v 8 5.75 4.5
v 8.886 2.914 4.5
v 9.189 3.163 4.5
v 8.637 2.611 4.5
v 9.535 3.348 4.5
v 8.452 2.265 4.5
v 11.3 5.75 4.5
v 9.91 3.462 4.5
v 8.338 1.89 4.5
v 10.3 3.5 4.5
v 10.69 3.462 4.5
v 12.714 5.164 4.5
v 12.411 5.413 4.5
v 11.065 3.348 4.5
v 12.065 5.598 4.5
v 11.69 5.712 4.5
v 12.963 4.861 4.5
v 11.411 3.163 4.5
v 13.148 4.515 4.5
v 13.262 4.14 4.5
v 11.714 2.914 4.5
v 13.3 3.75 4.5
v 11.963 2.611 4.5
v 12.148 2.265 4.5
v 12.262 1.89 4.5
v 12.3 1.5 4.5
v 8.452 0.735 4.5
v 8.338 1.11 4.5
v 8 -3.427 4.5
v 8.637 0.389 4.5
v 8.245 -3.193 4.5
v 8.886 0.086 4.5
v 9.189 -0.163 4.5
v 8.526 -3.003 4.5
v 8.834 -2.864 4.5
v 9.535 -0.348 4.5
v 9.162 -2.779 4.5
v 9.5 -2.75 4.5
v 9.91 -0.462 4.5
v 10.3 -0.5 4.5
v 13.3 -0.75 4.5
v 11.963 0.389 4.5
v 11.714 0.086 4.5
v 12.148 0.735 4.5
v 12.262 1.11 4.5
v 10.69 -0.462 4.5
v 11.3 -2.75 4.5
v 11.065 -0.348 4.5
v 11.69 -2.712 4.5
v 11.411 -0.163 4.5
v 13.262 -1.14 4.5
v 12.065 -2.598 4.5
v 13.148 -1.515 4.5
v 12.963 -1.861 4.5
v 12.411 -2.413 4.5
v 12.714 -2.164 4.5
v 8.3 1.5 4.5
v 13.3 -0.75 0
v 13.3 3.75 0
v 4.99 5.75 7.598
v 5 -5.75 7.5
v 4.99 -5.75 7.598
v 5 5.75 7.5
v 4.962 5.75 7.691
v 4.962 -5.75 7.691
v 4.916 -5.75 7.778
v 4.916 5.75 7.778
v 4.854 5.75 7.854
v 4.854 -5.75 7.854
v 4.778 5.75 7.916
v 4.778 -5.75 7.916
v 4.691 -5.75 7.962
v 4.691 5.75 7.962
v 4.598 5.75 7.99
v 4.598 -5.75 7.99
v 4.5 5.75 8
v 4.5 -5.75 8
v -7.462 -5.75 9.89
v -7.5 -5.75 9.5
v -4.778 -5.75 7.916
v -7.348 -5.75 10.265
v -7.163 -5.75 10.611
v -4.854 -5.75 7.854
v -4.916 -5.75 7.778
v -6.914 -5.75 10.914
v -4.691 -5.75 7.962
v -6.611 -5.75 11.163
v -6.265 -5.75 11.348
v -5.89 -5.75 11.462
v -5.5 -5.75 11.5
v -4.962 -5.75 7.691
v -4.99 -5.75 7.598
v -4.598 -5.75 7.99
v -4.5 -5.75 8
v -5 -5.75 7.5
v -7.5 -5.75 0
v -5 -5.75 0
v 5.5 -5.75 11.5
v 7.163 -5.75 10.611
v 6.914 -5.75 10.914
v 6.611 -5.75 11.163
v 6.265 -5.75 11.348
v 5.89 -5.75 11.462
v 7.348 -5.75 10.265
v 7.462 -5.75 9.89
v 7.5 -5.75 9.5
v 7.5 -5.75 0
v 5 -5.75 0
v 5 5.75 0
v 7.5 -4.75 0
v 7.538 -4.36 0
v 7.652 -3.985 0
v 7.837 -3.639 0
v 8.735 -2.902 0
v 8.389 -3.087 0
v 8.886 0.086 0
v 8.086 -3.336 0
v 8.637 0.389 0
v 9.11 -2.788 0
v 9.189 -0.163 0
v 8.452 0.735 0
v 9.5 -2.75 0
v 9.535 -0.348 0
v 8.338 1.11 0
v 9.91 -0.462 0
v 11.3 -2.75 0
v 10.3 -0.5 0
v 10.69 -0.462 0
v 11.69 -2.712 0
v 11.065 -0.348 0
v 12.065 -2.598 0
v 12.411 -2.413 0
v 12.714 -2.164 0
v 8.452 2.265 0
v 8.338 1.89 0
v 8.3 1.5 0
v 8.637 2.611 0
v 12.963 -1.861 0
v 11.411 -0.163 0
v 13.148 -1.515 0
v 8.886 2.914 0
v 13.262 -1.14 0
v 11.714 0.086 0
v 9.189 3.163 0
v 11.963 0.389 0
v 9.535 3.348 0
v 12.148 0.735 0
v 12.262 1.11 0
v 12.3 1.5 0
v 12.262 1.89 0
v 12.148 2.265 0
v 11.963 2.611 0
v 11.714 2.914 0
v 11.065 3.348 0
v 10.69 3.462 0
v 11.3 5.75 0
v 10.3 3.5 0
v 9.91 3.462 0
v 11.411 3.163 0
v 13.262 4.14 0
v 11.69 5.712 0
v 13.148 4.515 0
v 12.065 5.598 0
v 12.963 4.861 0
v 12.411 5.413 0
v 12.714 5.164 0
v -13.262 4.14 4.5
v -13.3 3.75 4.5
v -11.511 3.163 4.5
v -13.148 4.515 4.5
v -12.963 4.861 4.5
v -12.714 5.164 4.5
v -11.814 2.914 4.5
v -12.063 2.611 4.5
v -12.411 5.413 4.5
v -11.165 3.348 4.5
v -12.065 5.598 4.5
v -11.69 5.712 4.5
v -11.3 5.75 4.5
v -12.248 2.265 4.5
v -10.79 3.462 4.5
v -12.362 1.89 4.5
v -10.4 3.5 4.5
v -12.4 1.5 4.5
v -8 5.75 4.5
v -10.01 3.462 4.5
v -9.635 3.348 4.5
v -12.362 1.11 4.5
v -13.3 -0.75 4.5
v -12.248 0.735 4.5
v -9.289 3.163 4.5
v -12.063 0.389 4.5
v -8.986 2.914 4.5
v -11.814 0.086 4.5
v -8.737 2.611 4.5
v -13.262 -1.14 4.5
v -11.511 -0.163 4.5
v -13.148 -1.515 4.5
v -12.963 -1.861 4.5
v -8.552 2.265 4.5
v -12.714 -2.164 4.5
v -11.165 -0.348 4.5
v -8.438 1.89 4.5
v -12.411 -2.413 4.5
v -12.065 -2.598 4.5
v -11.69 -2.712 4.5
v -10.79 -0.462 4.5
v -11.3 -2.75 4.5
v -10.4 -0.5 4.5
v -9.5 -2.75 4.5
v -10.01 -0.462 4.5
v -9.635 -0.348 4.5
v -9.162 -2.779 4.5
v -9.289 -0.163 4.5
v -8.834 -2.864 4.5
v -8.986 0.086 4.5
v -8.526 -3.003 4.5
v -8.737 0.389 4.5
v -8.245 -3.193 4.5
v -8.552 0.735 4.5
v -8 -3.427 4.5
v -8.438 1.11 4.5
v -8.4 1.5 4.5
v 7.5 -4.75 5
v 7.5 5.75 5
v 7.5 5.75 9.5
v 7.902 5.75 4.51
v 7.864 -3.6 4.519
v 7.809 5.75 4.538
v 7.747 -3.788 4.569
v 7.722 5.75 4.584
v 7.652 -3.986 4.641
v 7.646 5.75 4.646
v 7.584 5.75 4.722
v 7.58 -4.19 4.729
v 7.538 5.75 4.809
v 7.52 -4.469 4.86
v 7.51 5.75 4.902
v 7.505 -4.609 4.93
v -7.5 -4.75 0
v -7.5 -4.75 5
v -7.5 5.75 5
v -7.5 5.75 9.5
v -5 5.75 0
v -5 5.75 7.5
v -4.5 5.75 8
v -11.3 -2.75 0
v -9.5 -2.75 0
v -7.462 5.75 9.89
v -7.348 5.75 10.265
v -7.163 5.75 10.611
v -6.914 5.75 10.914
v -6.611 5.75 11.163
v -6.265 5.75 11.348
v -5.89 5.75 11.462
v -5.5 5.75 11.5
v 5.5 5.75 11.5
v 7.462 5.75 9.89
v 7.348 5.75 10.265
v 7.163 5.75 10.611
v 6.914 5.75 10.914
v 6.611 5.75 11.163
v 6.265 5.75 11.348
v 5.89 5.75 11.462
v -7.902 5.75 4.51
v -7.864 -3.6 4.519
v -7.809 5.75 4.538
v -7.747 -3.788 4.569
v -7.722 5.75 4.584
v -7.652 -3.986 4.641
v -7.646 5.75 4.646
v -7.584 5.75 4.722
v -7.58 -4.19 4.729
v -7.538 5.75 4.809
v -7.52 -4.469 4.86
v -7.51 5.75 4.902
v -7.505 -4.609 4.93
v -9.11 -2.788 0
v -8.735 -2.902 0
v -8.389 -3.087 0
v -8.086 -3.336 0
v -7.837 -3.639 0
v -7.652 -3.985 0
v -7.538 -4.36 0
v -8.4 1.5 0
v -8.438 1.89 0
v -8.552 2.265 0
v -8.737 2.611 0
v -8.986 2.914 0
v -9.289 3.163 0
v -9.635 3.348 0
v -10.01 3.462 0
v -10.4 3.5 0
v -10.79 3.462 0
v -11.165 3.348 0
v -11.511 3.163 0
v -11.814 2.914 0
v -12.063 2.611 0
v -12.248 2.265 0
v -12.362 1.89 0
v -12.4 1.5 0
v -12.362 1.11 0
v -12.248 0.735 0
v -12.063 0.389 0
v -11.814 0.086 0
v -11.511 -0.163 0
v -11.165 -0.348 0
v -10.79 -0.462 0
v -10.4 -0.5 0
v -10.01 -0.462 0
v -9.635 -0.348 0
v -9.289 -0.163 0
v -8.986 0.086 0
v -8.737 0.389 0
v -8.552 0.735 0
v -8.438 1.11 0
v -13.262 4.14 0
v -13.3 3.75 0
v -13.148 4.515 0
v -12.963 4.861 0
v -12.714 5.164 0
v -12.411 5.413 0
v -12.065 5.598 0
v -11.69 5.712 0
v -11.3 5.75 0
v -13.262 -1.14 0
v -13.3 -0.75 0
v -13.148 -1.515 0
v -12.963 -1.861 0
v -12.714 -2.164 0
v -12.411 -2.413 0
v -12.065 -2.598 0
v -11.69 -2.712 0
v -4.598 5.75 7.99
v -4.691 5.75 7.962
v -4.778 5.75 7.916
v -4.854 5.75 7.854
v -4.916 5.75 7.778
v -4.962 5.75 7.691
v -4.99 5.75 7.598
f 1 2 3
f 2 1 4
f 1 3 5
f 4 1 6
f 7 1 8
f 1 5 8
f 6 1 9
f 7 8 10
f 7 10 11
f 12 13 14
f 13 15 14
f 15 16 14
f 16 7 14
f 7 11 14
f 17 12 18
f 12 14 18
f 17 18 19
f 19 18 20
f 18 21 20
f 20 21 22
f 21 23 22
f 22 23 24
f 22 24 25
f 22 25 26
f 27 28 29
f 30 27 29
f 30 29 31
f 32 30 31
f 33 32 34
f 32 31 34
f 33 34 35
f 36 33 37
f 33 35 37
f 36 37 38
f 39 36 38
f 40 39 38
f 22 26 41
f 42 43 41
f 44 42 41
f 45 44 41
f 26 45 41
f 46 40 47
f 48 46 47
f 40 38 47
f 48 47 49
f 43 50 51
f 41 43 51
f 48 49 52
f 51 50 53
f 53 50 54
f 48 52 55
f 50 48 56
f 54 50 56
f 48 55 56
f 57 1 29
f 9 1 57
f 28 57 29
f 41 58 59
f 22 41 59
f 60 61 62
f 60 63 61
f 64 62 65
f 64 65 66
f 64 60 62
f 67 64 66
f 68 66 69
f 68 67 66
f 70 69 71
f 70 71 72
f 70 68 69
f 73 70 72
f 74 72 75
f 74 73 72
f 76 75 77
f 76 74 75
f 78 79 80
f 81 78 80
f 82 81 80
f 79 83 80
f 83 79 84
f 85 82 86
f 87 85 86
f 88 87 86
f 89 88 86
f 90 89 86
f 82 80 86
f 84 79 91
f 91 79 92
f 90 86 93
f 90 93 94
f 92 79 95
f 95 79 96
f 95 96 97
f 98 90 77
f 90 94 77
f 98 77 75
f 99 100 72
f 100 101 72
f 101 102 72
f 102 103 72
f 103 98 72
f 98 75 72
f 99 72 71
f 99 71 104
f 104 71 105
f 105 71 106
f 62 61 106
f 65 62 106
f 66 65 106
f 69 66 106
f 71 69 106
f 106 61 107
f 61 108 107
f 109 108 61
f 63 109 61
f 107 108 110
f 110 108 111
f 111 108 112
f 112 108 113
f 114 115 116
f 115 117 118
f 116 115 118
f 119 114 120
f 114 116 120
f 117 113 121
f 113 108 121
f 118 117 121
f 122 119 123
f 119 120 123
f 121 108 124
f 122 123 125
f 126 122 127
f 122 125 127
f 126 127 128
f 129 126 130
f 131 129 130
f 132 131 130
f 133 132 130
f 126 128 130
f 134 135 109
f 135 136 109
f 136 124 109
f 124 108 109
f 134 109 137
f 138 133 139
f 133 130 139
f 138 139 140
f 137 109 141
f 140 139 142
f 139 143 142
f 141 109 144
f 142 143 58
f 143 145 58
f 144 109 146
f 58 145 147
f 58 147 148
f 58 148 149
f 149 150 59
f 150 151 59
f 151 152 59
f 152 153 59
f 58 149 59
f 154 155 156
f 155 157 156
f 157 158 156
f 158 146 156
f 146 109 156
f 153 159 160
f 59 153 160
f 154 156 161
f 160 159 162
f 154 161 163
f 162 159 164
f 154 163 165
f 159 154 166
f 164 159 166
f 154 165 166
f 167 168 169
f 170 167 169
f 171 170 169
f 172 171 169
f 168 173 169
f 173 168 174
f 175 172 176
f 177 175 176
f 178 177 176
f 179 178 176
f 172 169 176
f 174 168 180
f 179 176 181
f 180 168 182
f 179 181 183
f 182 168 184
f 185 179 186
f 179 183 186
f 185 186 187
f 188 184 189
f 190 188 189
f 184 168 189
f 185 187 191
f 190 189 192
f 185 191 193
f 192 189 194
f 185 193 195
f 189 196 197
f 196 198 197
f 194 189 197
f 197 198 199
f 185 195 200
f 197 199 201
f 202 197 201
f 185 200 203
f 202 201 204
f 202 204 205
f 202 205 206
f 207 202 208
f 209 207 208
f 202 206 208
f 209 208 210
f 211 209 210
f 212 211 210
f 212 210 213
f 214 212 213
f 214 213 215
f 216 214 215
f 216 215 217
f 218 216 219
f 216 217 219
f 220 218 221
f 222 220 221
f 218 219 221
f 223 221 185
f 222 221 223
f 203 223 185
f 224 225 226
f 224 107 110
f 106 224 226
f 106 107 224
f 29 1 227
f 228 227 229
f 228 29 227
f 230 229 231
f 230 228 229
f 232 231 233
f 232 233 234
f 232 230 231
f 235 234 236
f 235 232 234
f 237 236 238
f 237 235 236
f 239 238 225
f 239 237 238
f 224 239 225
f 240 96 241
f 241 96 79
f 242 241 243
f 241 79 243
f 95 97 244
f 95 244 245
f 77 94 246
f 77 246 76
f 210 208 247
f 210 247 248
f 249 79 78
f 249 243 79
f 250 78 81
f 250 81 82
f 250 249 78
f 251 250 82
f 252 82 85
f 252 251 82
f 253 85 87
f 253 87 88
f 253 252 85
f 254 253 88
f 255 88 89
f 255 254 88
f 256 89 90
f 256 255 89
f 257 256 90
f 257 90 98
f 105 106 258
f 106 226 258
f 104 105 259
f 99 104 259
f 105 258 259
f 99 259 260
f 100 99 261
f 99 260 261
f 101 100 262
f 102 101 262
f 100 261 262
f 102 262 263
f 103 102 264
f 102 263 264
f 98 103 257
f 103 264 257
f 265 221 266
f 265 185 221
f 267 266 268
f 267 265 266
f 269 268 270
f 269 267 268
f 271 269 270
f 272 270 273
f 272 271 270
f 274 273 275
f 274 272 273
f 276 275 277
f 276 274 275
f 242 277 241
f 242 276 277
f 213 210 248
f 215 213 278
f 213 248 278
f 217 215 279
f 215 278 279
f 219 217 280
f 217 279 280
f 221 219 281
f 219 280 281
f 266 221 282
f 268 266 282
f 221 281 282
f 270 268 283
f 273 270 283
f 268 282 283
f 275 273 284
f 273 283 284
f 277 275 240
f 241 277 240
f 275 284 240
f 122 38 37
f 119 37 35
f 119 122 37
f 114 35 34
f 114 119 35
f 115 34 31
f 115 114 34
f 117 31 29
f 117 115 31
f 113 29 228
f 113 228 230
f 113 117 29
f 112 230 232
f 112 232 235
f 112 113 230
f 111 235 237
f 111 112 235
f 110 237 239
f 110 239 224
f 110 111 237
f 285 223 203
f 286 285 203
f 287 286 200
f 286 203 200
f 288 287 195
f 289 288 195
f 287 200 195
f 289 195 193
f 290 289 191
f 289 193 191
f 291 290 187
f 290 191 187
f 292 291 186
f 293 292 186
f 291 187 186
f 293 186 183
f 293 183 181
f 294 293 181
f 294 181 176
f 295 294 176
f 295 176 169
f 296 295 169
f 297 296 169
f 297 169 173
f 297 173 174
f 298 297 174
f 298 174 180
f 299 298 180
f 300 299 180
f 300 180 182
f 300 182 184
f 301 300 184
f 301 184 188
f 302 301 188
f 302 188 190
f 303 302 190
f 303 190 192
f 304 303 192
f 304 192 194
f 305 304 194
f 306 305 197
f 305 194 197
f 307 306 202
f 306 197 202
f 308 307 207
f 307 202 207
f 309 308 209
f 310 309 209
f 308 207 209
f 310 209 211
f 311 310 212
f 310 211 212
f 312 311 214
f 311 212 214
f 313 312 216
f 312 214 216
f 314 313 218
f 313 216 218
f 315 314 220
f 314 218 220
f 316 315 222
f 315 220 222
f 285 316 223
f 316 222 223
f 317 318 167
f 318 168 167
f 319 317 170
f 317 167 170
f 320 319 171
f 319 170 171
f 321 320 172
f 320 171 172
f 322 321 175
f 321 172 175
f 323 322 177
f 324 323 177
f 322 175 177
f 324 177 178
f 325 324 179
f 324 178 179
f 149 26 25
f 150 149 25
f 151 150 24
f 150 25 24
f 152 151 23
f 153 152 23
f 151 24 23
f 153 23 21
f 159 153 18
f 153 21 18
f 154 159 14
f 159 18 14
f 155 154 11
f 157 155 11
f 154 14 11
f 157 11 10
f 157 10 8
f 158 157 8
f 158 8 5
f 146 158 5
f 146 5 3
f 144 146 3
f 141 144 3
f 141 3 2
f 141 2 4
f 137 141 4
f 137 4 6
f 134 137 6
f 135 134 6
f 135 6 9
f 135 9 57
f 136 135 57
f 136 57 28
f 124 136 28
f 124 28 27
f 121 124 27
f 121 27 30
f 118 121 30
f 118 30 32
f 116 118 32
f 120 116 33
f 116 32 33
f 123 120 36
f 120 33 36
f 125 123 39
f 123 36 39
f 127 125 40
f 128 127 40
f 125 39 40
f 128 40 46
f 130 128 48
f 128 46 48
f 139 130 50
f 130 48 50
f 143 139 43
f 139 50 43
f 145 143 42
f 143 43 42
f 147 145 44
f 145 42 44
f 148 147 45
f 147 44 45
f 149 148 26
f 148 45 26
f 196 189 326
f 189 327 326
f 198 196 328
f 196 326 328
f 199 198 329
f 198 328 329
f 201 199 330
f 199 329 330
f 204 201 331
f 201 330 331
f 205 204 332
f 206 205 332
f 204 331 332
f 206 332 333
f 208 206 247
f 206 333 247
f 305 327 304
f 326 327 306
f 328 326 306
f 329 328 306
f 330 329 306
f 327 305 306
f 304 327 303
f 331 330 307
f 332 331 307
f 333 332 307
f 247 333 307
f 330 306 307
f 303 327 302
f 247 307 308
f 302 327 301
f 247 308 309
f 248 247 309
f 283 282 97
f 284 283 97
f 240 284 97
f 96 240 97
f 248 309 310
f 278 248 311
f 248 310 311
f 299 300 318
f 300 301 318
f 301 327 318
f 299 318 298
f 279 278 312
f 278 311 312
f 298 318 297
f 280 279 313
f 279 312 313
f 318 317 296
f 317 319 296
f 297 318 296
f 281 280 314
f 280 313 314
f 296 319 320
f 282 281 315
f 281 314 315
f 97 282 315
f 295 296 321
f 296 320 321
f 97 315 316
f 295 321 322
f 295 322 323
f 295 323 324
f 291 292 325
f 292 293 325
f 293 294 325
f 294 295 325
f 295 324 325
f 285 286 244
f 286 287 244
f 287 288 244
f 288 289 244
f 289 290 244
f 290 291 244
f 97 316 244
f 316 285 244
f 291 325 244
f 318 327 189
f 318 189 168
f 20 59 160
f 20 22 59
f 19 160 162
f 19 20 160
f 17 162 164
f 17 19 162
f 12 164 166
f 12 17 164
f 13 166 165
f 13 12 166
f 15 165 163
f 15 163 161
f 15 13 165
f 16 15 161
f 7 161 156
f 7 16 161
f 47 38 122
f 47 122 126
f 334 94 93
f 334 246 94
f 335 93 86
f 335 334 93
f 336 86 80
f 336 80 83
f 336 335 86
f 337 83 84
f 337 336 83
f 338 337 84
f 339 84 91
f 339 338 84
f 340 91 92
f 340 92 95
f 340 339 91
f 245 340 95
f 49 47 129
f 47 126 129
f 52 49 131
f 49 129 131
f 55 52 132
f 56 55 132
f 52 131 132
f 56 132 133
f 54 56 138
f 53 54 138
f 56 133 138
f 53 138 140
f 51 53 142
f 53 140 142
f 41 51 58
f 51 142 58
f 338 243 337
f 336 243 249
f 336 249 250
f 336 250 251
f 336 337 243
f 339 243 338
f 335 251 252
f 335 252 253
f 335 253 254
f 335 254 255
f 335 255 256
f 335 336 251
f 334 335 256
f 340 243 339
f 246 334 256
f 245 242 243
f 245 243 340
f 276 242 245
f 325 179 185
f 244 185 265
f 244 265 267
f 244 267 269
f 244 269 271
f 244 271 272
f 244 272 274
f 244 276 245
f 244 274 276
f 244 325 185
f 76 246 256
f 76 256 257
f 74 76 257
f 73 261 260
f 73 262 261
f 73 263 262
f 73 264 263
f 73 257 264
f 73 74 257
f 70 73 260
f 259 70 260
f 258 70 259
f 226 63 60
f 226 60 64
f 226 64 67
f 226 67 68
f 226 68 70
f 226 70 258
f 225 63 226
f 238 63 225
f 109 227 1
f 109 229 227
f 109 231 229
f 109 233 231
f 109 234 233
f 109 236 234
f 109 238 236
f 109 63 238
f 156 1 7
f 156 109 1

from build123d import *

# Parameters (mm, degrees)
F0_W     = 26.6
F0_H     = 11.5
F1_DEPTH = 11.5
F2_W     = 5.8
F2_H     = 7
F2_W_2   = 10
F2_H_2   = 8
F3_DEPTH = 11.501
F4_W     = 5.8
F4_H     = 3
F4_R     = 2
F5_DEPTH = 4.501
F6_W     = 5.8
F6_H     = 3
F6_R     = 2
F7_DEPTH = 4.501
F8_R     = 2
F9_R     = 0.5


with BuildPart() as f1:
    # F0 (on Top) → F1 (new body)
    with BuildSketch(Plane.XY):
        Rectangle(F0_W, F0_H)
    extrude(amount=F1_DEPTH)

    # F2 (on face) → F3 (cut, through all)
    with BuildSketch(Plane.XZ.offset(5.75)):
        with Locations((-10.4, 8)):
            Rectangle(F2_W, F2_H)
        with Locations((10.4, 8)):
            Rectangle(F2_W, F2_H)
        with Locations((0, 4)):
            Rectangle(F2_W_2, F2_H_2)
    extrude(amount=-F3_DEPTH, mode=Mode.SUBTRACT)

    # F4 (on face) → F5 (cut, through all)
    with BuildSketch(Plane.XY.offset(4.5)):
        with Locations((-10.4, -4.25)):
            Rectangle(F4_W, F4_H)
        with Locations((-10.4, 1.5)):
            Circle(F4_R)
    extrude(amount=-F5_DEPTH, mode=Mode.SUBTRACT)

    # F6 (on face) → F7 (cut, through all)
    with BuildSketch(Plane.XY.offset(4.5)):
        with Locations((10.4, -4.25)):
            Rectangle(F6_W, F6_H)
        with Locations((10.3, 1.5)):
            Circle(F6_R)
    extrude(amount=-F7_DEPTH, mode=Mode.SUBTRACT)

    # F8
    f8_edges = [f1.edges().sort_by_distance(p)[0] for p in [
        (-7.5, 0, 11.5),
        (7.5, 0, 11.5),
        (-13.3, -2.75, 2.25),
        (-13.3, 5.75, 2.25),
        (-7.5, -2.75, 2.25),
        (13.3, 5.75, 2.25),
        (13.3, -2.75, 2.25),
        (7.5, -2.75, 2.25),
    ]]
    fillet(f8_edges, radius=F8_R)

    # F9
    f9_edges = [f1.edges().sort_by_distance(p)[0] for p in [
        (-7.5, 1.5, 4.5),
        (7.5, 1.5, 4.5),
        (-5, 0, 8),
        (5, 0, 8),
    ]]
    fillet(f9_edges, radius=F9_R)


solid = f1.part
